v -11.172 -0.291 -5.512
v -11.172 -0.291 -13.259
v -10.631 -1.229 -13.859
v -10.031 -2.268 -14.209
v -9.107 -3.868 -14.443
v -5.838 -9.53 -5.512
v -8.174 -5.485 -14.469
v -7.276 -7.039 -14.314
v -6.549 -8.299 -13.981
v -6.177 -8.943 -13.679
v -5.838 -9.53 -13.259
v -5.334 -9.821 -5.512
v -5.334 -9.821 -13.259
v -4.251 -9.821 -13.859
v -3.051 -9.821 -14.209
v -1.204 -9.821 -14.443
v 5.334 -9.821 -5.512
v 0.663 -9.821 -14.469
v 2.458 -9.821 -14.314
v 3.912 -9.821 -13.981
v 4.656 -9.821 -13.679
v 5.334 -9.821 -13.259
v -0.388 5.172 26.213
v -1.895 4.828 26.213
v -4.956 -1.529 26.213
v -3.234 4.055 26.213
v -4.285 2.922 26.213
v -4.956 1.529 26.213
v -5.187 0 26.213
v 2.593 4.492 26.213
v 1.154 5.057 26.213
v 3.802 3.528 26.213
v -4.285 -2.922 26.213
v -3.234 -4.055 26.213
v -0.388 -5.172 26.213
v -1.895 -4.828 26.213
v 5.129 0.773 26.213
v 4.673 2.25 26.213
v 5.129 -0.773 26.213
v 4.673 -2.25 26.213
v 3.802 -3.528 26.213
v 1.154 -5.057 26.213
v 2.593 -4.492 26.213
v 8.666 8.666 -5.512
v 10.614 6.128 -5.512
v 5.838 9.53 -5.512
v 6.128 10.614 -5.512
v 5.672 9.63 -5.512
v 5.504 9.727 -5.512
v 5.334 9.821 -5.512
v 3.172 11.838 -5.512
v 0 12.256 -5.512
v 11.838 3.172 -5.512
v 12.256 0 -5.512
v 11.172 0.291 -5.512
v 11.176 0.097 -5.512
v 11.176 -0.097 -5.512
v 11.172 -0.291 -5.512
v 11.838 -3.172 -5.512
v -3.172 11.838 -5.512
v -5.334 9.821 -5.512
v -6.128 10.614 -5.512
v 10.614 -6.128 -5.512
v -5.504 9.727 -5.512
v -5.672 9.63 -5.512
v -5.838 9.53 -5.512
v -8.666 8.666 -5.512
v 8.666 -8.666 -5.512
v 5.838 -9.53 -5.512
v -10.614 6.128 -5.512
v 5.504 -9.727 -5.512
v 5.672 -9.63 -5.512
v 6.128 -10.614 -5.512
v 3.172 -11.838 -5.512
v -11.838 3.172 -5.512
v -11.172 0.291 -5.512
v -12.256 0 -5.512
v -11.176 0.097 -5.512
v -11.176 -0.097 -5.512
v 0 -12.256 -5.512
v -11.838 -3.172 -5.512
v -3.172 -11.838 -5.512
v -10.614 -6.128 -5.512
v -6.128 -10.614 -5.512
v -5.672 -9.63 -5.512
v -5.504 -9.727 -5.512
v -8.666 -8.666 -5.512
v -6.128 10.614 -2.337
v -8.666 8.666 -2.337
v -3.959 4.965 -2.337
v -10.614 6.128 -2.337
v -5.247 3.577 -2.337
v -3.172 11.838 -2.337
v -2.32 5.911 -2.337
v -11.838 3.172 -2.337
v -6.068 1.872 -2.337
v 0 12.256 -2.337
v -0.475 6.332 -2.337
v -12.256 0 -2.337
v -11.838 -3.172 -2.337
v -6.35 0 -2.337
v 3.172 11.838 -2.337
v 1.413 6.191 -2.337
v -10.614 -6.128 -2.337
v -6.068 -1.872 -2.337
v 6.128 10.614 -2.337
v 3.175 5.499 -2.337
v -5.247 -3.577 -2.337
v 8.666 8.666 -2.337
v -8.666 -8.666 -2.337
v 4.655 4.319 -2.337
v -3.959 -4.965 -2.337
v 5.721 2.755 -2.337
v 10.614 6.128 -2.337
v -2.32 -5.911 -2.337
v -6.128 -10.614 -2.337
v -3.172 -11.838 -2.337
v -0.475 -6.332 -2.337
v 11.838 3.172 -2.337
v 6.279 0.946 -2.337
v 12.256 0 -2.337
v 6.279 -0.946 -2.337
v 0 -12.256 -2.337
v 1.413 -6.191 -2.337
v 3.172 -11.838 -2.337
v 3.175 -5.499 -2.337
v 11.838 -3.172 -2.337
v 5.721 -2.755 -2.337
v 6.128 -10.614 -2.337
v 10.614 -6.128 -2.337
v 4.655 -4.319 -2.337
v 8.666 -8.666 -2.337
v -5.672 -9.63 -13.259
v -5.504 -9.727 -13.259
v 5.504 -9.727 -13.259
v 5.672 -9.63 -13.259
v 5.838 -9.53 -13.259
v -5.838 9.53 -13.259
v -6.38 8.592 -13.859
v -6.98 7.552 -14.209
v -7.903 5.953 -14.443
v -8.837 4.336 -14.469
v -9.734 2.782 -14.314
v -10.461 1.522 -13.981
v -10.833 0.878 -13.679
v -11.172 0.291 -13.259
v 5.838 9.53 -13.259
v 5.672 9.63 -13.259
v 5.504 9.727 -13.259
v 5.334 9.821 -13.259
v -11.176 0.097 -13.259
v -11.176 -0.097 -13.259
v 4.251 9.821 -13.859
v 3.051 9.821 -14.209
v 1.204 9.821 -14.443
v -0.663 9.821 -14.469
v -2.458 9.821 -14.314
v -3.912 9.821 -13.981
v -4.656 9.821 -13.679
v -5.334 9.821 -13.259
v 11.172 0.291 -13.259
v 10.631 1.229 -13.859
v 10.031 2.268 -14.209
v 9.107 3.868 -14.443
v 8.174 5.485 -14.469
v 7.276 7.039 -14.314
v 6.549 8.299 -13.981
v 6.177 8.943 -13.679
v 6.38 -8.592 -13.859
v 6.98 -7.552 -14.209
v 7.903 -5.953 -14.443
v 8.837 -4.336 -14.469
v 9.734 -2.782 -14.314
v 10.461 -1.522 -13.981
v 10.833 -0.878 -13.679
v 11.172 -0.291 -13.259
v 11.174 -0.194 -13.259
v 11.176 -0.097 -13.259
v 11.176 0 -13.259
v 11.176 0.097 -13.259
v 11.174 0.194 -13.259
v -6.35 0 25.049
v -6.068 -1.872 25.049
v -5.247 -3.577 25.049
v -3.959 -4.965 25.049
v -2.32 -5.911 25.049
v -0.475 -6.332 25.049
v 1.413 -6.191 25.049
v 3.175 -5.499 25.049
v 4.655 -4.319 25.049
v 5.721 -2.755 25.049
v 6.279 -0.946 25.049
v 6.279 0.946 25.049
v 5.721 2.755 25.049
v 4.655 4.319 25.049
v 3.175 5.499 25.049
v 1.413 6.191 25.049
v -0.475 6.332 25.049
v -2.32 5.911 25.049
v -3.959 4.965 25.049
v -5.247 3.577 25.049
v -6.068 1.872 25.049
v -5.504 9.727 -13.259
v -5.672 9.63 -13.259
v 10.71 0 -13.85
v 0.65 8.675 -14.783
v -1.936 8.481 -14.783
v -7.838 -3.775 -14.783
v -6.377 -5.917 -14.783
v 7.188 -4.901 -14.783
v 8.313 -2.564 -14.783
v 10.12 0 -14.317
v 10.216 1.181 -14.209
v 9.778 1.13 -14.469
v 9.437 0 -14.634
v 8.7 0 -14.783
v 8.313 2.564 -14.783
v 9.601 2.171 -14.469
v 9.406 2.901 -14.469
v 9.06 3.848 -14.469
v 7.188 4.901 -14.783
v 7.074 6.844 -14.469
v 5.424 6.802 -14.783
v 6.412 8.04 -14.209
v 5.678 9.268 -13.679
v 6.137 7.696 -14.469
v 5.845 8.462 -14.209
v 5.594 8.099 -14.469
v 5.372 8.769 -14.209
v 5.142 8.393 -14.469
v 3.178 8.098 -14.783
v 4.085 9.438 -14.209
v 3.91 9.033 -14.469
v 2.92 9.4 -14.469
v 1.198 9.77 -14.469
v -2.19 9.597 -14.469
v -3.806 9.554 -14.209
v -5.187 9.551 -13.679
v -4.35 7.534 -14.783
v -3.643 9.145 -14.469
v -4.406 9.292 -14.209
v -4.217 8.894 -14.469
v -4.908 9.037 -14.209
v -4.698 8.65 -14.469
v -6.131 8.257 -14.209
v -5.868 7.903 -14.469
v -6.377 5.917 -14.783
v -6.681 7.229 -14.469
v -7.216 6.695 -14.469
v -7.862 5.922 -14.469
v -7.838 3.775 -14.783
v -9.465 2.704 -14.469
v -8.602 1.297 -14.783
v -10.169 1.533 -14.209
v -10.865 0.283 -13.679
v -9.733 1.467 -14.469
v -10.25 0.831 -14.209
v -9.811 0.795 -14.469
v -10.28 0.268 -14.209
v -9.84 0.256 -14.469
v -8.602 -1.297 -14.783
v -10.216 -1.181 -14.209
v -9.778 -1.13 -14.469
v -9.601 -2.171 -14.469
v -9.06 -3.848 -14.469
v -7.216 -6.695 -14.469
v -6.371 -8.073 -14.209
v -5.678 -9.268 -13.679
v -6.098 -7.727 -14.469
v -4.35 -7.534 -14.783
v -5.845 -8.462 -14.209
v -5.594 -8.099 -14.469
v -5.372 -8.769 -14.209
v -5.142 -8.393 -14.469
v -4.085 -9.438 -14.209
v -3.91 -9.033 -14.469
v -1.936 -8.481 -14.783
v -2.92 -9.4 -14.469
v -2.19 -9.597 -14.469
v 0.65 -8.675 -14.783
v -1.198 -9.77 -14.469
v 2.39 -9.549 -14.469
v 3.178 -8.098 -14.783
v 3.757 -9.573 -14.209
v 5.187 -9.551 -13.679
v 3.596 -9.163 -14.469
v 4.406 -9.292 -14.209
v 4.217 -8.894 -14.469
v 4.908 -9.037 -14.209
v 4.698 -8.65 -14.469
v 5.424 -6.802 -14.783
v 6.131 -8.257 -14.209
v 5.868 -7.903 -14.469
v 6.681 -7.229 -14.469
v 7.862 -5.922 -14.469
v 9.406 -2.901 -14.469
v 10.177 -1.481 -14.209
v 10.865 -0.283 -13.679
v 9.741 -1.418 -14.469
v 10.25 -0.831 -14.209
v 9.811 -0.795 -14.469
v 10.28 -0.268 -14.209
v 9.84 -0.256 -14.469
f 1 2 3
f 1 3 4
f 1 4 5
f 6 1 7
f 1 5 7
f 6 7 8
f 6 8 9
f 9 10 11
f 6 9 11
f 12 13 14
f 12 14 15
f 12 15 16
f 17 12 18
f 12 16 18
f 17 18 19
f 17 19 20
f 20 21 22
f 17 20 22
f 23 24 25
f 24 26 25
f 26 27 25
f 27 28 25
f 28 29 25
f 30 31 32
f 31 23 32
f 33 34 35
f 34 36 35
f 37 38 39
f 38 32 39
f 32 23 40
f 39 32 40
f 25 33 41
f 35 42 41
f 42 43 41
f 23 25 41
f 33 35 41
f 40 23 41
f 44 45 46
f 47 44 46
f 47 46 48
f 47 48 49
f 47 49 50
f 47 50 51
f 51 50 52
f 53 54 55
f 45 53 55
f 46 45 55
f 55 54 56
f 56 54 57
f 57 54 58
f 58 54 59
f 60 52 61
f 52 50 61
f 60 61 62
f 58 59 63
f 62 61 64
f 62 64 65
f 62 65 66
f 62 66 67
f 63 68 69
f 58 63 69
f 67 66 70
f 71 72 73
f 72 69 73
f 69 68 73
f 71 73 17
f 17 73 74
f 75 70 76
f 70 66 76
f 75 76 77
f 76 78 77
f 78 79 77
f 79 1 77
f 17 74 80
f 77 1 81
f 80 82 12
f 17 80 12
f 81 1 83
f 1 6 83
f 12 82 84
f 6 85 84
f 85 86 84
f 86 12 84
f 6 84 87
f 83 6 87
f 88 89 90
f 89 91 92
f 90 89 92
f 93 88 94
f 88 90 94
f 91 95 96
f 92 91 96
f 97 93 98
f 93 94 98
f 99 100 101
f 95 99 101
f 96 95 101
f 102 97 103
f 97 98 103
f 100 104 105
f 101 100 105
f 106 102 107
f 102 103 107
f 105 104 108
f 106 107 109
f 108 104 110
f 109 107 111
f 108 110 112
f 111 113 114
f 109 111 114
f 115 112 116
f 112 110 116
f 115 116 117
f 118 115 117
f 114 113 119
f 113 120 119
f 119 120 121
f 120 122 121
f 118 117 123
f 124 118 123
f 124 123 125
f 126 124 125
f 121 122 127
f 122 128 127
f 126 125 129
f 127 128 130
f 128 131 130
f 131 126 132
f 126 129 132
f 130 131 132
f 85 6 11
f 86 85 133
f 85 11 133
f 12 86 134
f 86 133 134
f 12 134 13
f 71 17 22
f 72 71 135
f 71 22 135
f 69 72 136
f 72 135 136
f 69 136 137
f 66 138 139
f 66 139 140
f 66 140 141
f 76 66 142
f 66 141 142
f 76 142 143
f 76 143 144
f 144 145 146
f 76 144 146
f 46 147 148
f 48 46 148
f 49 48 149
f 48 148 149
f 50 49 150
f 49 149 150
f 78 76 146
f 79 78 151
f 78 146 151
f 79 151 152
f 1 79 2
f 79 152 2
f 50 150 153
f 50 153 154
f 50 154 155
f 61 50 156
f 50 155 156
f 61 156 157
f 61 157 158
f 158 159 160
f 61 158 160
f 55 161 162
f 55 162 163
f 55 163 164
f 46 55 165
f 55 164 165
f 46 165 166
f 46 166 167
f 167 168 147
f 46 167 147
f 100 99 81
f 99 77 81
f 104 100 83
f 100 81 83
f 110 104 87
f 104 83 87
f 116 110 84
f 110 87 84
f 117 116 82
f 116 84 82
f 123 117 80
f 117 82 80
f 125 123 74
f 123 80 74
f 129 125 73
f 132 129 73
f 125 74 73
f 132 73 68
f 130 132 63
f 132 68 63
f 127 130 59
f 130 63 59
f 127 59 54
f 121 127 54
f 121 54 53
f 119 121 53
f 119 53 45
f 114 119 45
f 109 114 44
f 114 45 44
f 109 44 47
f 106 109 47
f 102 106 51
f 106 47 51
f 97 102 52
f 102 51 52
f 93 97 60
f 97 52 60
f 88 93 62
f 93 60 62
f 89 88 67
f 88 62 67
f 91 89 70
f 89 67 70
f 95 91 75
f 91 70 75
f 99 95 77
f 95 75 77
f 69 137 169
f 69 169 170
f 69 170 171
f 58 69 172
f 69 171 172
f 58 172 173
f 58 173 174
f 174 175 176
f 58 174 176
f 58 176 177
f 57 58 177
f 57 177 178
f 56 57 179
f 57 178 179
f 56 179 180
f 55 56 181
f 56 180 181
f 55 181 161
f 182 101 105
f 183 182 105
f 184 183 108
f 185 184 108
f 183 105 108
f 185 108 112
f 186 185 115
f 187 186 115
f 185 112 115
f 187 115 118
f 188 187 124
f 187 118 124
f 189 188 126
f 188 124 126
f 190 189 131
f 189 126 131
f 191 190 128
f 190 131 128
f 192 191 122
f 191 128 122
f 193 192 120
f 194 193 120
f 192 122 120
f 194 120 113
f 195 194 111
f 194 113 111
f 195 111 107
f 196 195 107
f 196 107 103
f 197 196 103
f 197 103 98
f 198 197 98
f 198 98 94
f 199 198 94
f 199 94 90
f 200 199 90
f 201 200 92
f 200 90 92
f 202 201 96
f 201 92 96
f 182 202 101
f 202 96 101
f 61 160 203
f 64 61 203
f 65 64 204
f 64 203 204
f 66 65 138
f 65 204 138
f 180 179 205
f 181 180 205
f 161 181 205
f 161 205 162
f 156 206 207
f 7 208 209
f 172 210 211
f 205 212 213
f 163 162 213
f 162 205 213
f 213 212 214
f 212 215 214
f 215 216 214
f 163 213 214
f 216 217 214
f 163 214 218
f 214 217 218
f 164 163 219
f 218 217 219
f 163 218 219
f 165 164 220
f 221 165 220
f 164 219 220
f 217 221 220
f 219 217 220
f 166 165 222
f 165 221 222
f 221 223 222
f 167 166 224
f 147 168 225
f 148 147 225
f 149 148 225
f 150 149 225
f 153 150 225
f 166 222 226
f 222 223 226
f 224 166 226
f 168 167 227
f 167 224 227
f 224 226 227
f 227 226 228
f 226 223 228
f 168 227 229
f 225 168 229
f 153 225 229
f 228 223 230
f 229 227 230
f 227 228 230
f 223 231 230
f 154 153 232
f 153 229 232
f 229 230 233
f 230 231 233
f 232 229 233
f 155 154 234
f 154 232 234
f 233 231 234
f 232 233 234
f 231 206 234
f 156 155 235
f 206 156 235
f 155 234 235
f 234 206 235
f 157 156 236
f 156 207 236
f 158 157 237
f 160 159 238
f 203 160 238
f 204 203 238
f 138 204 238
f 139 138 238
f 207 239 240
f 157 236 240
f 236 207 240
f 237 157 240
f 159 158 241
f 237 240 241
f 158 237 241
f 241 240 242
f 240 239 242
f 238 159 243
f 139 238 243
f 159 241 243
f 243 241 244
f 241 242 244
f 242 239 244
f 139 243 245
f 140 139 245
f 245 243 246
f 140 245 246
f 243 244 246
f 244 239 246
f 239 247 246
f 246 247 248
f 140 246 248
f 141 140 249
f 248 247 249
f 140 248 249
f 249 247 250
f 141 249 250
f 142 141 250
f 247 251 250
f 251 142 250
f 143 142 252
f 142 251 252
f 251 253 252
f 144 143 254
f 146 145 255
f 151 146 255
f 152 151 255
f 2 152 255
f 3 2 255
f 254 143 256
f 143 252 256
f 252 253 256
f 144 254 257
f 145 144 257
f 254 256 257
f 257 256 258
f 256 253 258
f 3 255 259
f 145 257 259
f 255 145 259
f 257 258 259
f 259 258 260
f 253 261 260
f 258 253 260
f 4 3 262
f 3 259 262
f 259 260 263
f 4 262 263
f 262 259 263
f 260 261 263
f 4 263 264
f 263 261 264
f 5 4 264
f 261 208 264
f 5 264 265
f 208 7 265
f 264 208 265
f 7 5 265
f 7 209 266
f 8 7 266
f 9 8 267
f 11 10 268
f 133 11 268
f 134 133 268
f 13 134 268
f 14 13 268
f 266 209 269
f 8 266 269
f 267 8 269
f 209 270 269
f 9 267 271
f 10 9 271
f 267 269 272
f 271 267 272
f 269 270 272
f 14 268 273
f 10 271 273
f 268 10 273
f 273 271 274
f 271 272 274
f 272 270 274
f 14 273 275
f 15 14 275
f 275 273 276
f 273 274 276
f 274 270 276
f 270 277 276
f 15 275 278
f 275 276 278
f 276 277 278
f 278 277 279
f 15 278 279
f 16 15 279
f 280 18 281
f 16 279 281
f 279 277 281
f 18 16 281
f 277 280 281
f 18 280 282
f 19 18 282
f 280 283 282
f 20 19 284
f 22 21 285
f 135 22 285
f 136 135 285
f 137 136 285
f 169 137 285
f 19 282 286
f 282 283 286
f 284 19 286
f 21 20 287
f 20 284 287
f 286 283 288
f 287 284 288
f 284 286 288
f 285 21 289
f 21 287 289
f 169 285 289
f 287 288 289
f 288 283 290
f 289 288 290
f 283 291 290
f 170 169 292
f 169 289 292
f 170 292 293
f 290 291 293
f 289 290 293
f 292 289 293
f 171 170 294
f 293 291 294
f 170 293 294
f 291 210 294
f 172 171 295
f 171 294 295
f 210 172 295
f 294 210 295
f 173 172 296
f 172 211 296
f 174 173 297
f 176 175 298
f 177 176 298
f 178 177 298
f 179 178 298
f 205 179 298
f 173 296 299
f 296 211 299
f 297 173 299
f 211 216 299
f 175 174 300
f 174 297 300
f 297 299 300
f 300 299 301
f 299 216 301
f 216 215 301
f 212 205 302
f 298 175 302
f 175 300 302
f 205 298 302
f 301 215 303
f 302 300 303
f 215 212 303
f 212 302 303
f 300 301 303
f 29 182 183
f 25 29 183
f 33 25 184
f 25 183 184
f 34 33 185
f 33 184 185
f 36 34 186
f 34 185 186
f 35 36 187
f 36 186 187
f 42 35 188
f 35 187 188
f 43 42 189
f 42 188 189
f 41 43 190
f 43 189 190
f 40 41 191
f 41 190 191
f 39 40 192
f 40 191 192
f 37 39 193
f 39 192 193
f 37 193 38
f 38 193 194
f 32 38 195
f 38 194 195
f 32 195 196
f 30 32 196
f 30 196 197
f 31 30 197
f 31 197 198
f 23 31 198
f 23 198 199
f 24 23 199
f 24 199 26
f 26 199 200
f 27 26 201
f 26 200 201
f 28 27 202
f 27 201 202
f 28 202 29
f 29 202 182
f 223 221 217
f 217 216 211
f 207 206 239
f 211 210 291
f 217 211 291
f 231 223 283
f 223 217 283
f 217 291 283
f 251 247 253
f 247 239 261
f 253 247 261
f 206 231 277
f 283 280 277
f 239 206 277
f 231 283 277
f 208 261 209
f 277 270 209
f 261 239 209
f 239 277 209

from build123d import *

# Parameters (mm, degrees)
CUT_EXTRUDE1_DEPTH = 9.271
CHAMFER1_SIZE      = 1.16332


with BuildPart() as part:
    # Sketch1 → Revolve2 (revolve)
    with BuildSketch(Plane(origin=(0, 0, 0), x_dir=(1, 0, 0), z_dir=(0, 1, 0))):
        Polygon((0, 14.782898833), (0, -26.212701167), (-6.35, -26.212701167), (-6.35, 2.336898833), (-12.2555, 2.336898833), (-12.2555, 5.511898833), (-11.176, 5.511898833), (-11.176, 14.782898833), align=None)
    revolve(axis=Axis((0, 0, -24.892494163), (0, 0, 1)))

    # Sketch3 → Cut-Extrude1 (cut)
    with BuildSketch(Plane(origin=(0, 0, -14.782898833), x_dir=(-1, 0, 0), z_dir=(0, 0, -1))):
        with BuildLine():
            ThreePointArc((5.334, 9.820968384), (0, 11.176), (-5.334, 9.820968384))
            Line((-5.334, 9.820968384), (5.334, 9.820968384))
        make_face()
        with BuildLine():
            Line((-11.17220811, 0.291104688), (-5.83820811, 9.529863696))
            ThreePointArc((-5.83820811, 9.529863696), (-9.678699913, 5.588), (-11.17220811, 0.291104688))
        make_face()
        with BuildLine():
            Line((-5.83820811, -9.529863696), (-11.17220811, -0.291104688))
            ThreePointArc((-11.17220811, -0.291104688), (-9.678699913, -5.588), (-5.83820811, -9.529863696))
        make_face()
        with BuildLine():
            Line((5.334, -9.820968384), (-5.334, -9.820968384))
            ThreePointArc((-5.334, -9.820968384), (0, -11.176), (5.334, -9.820968384))
        make_face()
        with BuildLine():
            ThreePointArc((5.83820811, -9.529863696), (9.678699913, -5.588), (11.17220811, -0.291104688))
            Line((11.17220811, -0.291104688), (5.83820811, -9.529863696))
        make_face()
        with BuildLine():
            ThreePointArc((11.17220811, 0.291104688), (9.678699913, 5.588), (5.83820811, 9.529863696))
            Line((5.83820811, 9.529863696), (11.17220811, 0.291104688))
        make_face()
    extrude(amount=-CUT_EXTRUDE1_DEPTH, mode=Mode.SUBTRACT)

    # Sketch4 → Cut-Revolve1 (revolve, cut)
    with BuildSketch(Plane(origin=(0, 0, 0), x_dir=(1, 0, 0), z_dir=(0, 1, 0))):
        with BuildLine():
            Line((8.6995, 14.782898833), (11.176, 14.782898833))
            Line((11.176, 14.782898833), (11.176, 13.258898833))
            ThreePointArc((11.176, 13.258898833), (10.119876474, 14.316854353), (8.6995, 14.782898833))
        make_face()
    revolve(axis=Axis((0, 0, -20.186462401), (0, 0, 1)), mode=Mode.SUBTRACT)

    # Chamfer1
    chamfer1_edges = [part.edges().sort_by_distance(p)[0] for p in [
        (6.35, 0, 26.212701167),
    ]]
    chamfer(chamfer1_edges, length=CHAMFER1_SIZE)


solid = part.part
